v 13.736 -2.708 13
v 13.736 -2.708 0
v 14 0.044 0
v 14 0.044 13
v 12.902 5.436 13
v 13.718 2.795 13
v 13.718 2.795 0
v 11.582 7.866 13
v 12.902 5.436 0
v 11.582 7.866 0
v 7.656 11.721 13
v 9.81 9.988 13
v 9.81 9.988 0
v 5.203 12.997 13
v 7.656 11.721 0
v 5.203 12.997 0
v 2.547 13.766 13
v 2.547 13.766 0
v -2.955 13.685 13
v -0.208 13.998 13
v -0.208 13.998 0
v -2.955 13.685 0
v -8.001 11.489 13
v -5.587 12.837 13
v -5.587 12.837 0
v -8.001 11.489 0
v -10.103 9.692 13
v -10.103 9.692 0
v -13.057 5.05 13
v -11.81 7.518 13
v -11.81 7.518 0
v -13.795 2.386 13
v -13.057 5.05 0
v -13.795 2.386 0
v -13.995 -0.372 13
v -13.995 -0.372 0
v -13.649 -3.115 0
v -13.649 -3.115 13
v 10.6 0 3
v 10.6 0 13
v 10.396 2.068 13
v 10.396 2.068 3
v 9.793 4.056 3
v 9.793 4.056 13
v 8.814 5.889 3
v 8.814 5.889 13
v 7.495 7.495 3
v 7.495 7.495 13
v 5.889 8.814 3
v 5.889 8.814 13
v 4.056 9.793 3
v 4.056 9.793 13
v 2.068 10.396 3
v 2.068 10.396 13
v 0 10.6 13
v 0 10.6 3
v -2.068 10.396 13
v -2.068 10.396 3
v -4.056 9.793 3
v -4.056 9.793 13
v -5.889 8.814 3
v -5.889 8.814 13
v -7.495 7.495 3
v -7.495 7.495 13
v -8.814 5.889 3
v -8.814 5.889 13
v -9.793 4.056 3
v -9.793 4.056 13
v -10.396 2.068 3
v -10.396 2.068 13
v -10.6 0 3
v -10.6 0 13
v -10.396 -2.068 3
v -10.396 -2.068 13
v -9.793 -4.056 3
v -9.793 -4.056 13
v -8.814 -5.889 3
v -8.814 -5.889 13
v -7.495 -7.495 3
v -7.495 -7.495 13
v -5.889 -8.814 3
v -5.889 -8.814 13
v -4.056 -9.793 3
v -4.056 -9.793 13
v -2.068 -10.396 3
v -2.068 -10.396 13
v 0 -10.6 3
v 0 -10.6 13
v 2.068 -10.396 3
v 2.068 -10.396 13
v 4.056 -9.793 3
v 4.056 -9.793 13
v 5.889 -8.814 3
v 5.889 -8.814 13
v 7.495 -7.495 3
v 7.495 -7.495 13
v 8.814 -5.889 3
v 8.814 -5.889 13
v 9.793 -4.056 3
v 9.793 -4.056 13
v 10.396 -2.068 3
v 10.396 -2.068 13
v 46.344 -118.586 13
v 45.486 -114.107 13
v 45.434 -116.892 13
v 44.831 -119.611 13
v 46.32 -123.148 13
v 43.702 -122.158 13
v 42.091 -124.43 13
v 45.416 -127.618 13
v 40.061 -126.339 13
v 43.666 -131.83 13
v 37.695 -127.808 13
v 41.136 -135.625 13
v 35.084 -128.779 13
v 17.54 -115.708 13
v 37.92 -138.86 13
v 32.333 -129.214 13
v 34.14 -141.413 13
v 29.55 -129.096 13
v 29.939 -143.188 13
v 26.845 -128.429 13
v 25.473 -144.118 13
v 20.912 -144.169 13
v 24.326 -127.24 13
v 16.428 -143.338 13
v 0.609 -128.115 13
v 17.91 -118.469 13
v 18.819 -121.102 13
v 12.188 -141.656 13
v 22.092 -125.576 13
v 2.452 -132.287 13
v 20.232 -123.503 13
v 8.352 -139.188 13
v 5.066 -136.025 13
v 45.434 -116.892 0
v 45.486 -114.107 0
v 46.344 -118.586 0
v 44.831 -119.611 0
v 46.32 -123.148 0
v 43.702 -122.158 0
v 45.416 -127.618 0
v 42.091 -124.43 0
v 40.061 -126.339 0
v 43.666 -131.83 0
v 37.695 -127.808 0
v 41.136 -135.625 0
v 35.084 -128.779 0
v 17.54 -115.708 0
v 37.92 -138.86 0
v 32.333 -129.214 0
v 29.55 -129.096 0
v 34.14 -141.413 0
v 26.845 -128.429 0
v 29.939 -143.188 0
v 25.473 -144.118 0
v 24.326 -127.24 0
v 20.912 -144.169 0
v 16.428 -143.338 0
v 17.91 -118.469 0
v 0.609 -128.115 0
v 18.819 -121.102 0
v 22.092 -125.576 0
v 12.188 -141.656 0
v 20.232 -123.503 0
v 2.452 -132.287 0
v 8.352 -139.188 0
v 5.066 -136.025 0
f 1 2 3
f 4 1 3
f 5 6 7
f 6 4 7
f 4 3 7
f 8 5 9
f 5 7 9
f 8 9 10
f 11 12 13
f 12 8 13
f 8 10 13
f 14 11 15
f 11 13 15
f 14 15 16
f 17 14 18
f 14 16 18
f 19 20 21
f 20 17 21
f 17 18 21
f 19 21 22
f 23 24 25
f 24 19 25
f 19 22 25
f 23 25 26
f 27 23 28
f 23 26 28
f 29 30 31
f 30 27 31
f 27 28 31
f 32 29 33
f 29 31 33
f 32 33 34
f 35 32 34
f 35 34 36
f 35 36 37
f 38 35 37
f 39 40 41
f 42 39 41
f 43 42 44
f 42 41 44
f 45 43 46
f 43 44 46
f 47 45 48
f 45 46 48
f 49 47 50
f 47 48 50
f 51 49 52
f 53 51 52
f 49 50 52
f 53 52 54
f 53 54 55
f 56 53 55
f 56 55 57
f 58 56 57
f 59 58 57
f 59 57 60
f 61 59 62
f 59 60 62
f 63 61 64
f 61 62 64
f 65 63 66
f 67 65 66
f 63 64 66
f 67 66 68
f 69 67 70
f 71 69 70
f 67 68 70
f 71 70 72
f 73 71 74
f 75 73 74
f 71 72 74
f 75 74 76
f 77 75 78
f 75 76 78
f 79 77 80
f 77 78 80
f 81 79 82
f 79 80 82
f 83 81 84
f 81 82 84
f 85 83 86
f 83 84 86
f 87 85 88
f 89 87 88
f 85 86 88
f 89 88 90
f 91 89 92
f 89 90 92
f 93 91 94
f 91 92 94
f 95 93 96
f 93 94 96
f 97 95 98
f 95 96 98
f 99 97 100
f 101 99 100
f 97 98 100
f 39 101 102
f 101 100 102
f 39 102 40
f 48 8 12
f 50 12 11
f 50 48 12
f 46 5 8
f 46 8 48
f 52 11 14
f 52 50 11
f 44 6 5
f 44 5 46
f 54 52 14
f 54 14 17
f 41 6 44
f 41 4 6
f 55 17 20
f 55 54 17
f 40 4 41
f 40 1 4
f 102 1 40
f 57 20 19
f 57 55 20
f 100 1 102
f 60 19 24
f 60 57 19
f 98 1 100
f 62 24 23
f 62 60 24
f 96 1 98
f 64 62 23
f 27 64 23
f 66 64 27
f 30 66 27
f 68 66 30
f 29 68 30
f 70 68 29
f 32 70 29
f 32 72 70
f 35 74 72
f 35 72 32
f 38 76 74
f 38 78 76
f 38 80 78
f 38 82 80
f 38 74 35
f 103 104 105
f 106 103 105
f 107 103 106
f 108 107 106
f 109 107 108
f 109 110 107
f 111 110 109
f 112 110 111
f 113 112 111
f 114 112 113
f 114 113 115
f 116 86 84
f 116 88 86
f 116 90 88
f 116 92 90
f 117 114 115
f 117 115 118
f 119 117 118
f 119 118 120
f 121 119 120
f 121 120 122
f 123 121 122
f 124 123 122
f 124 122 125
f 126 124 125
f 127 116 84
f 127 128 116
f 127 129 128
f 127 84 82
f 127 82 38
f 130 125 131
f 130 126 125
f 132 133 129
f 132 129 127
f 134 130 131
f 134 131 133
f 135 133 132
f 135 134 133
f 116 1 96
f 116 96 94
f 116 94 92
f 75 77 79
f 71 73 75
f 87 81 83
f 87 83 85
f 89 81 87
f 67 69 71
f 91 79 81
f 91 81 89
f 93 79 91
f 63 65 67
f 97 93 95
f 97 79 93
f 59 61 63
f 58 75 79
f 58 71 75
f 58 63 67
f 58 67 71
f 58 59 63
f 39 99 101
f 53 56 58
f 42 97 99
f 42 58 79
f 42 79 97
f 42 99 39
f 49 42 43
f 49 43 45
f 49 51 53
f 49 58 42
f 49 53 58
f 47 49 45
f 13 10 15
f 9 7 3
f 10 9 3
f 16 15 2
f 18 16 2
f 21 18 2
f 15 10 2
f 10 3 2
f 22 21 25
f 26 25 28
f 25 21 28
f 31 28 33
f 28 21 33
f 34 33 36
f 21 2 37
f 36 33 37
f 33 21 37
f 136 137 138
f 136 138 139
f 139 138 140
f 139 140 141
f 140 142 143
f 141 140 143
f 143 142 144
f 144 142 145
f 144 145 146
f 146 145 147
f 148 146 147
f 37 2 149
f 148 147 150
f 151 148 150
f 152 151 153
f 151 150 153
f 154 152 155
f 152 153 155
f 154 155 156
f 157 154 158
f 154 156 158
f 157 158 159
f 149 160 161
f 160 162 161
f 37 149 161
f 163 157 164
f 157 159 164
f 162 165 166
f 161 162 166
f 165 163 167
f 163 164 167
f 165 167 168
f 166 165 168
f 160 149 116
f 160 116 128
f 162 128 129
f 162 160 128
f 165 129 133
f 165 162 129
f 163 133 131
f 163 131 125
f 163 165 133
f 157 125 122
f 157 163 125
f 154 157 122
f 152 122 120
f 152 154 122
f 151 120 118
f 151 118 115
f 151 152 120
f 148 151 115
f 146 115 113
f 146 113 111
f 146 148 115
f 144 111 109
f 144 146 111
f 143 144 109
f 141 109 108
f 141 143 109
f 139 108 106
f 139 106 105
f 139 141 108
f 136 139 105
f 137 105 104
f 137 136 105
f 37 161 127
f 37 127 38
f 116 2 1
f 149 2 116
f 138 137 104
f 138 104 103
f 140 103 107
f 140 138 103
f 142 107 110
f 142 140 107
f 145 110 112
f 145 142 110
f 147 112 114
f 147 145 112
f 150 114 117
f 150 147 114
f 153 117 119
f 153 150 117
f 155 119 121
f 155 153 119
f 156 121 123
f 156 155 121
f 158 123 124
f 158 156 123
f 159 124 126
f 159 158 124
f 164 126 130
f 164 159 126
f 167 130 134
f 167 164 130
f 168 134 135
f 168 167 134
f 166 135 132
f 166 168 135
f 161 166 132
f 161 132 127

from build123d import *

# Parameters (mm, degrees)
SKETCH_1_R          = 14
EXTRUDE_1_DEPTH     = 13
SKETCH_3_R          = 4
CUT_EXTRUDE_2_DEPTH = 10
EXTRUDE_START       = -13
EXTRUDE_3_DEPTH     = 13
SKETCH_7_R          = 10.6
CUT_EXTRUDE_3_DEPTH = 10


with BuildPart() as part:
    # 스케치1 → 보스-돌출1 (new body)
    with BuildSketch(Plane.XY):
        with Locations(Location((0, 0, 0), (0, 0, 180))):
            Circle(SKETCH_1_R)
    extrude(amount=EXTRUDE_1_DEPTH)

    # 스케치3 → 컷-돌출2 (cut)
    with BuildSketch(Plane.XY.offset(13)):
        Circle(SKETCH_3_R)
    extrude(amount=-CUT_EXTRUDE_2_DEPTH, mode=Mode.SUBTRACT)

    # 스케치6 → 보스-돌출3 (add)
    with BuildSketch(Plane.XY.offset(13).offset(EXTRUDE_START)):
        with BuildLine():
            Line((13.735578357, -2.708115061), (17.539668143, -115.708115061))
            ThreePointArc((17.539668143, -115.708115061), (32.332669837, -129.214149758), (45.486033392, -114.10670459))
            ThreePointArc((45.486033392, -114.10670459), (29.938586036, -143.187708961), (0.608578272, -128.115264599))
            Line((0.608578272, -128.115264599), (-13.64899727, -3.115264599))
            ThreePointArc((-13.64899727, -3.115264599), (0.208126783, -13.998452887), (13.735578357, -2.708115061))
        make_face()
    extrude(amount=EXTRUDE_3_DEPTH)

    # 스케치7 → 컷-돌출3 (cut)
    with BuildSketch(Plane.XY.offset(13)):
        Circle(SKETCH_7_R)
    extrude(amount=-CUT_EXTRUDE_3_DEPTH, mode=Mode.SUBTRACT)


solid = part.part
